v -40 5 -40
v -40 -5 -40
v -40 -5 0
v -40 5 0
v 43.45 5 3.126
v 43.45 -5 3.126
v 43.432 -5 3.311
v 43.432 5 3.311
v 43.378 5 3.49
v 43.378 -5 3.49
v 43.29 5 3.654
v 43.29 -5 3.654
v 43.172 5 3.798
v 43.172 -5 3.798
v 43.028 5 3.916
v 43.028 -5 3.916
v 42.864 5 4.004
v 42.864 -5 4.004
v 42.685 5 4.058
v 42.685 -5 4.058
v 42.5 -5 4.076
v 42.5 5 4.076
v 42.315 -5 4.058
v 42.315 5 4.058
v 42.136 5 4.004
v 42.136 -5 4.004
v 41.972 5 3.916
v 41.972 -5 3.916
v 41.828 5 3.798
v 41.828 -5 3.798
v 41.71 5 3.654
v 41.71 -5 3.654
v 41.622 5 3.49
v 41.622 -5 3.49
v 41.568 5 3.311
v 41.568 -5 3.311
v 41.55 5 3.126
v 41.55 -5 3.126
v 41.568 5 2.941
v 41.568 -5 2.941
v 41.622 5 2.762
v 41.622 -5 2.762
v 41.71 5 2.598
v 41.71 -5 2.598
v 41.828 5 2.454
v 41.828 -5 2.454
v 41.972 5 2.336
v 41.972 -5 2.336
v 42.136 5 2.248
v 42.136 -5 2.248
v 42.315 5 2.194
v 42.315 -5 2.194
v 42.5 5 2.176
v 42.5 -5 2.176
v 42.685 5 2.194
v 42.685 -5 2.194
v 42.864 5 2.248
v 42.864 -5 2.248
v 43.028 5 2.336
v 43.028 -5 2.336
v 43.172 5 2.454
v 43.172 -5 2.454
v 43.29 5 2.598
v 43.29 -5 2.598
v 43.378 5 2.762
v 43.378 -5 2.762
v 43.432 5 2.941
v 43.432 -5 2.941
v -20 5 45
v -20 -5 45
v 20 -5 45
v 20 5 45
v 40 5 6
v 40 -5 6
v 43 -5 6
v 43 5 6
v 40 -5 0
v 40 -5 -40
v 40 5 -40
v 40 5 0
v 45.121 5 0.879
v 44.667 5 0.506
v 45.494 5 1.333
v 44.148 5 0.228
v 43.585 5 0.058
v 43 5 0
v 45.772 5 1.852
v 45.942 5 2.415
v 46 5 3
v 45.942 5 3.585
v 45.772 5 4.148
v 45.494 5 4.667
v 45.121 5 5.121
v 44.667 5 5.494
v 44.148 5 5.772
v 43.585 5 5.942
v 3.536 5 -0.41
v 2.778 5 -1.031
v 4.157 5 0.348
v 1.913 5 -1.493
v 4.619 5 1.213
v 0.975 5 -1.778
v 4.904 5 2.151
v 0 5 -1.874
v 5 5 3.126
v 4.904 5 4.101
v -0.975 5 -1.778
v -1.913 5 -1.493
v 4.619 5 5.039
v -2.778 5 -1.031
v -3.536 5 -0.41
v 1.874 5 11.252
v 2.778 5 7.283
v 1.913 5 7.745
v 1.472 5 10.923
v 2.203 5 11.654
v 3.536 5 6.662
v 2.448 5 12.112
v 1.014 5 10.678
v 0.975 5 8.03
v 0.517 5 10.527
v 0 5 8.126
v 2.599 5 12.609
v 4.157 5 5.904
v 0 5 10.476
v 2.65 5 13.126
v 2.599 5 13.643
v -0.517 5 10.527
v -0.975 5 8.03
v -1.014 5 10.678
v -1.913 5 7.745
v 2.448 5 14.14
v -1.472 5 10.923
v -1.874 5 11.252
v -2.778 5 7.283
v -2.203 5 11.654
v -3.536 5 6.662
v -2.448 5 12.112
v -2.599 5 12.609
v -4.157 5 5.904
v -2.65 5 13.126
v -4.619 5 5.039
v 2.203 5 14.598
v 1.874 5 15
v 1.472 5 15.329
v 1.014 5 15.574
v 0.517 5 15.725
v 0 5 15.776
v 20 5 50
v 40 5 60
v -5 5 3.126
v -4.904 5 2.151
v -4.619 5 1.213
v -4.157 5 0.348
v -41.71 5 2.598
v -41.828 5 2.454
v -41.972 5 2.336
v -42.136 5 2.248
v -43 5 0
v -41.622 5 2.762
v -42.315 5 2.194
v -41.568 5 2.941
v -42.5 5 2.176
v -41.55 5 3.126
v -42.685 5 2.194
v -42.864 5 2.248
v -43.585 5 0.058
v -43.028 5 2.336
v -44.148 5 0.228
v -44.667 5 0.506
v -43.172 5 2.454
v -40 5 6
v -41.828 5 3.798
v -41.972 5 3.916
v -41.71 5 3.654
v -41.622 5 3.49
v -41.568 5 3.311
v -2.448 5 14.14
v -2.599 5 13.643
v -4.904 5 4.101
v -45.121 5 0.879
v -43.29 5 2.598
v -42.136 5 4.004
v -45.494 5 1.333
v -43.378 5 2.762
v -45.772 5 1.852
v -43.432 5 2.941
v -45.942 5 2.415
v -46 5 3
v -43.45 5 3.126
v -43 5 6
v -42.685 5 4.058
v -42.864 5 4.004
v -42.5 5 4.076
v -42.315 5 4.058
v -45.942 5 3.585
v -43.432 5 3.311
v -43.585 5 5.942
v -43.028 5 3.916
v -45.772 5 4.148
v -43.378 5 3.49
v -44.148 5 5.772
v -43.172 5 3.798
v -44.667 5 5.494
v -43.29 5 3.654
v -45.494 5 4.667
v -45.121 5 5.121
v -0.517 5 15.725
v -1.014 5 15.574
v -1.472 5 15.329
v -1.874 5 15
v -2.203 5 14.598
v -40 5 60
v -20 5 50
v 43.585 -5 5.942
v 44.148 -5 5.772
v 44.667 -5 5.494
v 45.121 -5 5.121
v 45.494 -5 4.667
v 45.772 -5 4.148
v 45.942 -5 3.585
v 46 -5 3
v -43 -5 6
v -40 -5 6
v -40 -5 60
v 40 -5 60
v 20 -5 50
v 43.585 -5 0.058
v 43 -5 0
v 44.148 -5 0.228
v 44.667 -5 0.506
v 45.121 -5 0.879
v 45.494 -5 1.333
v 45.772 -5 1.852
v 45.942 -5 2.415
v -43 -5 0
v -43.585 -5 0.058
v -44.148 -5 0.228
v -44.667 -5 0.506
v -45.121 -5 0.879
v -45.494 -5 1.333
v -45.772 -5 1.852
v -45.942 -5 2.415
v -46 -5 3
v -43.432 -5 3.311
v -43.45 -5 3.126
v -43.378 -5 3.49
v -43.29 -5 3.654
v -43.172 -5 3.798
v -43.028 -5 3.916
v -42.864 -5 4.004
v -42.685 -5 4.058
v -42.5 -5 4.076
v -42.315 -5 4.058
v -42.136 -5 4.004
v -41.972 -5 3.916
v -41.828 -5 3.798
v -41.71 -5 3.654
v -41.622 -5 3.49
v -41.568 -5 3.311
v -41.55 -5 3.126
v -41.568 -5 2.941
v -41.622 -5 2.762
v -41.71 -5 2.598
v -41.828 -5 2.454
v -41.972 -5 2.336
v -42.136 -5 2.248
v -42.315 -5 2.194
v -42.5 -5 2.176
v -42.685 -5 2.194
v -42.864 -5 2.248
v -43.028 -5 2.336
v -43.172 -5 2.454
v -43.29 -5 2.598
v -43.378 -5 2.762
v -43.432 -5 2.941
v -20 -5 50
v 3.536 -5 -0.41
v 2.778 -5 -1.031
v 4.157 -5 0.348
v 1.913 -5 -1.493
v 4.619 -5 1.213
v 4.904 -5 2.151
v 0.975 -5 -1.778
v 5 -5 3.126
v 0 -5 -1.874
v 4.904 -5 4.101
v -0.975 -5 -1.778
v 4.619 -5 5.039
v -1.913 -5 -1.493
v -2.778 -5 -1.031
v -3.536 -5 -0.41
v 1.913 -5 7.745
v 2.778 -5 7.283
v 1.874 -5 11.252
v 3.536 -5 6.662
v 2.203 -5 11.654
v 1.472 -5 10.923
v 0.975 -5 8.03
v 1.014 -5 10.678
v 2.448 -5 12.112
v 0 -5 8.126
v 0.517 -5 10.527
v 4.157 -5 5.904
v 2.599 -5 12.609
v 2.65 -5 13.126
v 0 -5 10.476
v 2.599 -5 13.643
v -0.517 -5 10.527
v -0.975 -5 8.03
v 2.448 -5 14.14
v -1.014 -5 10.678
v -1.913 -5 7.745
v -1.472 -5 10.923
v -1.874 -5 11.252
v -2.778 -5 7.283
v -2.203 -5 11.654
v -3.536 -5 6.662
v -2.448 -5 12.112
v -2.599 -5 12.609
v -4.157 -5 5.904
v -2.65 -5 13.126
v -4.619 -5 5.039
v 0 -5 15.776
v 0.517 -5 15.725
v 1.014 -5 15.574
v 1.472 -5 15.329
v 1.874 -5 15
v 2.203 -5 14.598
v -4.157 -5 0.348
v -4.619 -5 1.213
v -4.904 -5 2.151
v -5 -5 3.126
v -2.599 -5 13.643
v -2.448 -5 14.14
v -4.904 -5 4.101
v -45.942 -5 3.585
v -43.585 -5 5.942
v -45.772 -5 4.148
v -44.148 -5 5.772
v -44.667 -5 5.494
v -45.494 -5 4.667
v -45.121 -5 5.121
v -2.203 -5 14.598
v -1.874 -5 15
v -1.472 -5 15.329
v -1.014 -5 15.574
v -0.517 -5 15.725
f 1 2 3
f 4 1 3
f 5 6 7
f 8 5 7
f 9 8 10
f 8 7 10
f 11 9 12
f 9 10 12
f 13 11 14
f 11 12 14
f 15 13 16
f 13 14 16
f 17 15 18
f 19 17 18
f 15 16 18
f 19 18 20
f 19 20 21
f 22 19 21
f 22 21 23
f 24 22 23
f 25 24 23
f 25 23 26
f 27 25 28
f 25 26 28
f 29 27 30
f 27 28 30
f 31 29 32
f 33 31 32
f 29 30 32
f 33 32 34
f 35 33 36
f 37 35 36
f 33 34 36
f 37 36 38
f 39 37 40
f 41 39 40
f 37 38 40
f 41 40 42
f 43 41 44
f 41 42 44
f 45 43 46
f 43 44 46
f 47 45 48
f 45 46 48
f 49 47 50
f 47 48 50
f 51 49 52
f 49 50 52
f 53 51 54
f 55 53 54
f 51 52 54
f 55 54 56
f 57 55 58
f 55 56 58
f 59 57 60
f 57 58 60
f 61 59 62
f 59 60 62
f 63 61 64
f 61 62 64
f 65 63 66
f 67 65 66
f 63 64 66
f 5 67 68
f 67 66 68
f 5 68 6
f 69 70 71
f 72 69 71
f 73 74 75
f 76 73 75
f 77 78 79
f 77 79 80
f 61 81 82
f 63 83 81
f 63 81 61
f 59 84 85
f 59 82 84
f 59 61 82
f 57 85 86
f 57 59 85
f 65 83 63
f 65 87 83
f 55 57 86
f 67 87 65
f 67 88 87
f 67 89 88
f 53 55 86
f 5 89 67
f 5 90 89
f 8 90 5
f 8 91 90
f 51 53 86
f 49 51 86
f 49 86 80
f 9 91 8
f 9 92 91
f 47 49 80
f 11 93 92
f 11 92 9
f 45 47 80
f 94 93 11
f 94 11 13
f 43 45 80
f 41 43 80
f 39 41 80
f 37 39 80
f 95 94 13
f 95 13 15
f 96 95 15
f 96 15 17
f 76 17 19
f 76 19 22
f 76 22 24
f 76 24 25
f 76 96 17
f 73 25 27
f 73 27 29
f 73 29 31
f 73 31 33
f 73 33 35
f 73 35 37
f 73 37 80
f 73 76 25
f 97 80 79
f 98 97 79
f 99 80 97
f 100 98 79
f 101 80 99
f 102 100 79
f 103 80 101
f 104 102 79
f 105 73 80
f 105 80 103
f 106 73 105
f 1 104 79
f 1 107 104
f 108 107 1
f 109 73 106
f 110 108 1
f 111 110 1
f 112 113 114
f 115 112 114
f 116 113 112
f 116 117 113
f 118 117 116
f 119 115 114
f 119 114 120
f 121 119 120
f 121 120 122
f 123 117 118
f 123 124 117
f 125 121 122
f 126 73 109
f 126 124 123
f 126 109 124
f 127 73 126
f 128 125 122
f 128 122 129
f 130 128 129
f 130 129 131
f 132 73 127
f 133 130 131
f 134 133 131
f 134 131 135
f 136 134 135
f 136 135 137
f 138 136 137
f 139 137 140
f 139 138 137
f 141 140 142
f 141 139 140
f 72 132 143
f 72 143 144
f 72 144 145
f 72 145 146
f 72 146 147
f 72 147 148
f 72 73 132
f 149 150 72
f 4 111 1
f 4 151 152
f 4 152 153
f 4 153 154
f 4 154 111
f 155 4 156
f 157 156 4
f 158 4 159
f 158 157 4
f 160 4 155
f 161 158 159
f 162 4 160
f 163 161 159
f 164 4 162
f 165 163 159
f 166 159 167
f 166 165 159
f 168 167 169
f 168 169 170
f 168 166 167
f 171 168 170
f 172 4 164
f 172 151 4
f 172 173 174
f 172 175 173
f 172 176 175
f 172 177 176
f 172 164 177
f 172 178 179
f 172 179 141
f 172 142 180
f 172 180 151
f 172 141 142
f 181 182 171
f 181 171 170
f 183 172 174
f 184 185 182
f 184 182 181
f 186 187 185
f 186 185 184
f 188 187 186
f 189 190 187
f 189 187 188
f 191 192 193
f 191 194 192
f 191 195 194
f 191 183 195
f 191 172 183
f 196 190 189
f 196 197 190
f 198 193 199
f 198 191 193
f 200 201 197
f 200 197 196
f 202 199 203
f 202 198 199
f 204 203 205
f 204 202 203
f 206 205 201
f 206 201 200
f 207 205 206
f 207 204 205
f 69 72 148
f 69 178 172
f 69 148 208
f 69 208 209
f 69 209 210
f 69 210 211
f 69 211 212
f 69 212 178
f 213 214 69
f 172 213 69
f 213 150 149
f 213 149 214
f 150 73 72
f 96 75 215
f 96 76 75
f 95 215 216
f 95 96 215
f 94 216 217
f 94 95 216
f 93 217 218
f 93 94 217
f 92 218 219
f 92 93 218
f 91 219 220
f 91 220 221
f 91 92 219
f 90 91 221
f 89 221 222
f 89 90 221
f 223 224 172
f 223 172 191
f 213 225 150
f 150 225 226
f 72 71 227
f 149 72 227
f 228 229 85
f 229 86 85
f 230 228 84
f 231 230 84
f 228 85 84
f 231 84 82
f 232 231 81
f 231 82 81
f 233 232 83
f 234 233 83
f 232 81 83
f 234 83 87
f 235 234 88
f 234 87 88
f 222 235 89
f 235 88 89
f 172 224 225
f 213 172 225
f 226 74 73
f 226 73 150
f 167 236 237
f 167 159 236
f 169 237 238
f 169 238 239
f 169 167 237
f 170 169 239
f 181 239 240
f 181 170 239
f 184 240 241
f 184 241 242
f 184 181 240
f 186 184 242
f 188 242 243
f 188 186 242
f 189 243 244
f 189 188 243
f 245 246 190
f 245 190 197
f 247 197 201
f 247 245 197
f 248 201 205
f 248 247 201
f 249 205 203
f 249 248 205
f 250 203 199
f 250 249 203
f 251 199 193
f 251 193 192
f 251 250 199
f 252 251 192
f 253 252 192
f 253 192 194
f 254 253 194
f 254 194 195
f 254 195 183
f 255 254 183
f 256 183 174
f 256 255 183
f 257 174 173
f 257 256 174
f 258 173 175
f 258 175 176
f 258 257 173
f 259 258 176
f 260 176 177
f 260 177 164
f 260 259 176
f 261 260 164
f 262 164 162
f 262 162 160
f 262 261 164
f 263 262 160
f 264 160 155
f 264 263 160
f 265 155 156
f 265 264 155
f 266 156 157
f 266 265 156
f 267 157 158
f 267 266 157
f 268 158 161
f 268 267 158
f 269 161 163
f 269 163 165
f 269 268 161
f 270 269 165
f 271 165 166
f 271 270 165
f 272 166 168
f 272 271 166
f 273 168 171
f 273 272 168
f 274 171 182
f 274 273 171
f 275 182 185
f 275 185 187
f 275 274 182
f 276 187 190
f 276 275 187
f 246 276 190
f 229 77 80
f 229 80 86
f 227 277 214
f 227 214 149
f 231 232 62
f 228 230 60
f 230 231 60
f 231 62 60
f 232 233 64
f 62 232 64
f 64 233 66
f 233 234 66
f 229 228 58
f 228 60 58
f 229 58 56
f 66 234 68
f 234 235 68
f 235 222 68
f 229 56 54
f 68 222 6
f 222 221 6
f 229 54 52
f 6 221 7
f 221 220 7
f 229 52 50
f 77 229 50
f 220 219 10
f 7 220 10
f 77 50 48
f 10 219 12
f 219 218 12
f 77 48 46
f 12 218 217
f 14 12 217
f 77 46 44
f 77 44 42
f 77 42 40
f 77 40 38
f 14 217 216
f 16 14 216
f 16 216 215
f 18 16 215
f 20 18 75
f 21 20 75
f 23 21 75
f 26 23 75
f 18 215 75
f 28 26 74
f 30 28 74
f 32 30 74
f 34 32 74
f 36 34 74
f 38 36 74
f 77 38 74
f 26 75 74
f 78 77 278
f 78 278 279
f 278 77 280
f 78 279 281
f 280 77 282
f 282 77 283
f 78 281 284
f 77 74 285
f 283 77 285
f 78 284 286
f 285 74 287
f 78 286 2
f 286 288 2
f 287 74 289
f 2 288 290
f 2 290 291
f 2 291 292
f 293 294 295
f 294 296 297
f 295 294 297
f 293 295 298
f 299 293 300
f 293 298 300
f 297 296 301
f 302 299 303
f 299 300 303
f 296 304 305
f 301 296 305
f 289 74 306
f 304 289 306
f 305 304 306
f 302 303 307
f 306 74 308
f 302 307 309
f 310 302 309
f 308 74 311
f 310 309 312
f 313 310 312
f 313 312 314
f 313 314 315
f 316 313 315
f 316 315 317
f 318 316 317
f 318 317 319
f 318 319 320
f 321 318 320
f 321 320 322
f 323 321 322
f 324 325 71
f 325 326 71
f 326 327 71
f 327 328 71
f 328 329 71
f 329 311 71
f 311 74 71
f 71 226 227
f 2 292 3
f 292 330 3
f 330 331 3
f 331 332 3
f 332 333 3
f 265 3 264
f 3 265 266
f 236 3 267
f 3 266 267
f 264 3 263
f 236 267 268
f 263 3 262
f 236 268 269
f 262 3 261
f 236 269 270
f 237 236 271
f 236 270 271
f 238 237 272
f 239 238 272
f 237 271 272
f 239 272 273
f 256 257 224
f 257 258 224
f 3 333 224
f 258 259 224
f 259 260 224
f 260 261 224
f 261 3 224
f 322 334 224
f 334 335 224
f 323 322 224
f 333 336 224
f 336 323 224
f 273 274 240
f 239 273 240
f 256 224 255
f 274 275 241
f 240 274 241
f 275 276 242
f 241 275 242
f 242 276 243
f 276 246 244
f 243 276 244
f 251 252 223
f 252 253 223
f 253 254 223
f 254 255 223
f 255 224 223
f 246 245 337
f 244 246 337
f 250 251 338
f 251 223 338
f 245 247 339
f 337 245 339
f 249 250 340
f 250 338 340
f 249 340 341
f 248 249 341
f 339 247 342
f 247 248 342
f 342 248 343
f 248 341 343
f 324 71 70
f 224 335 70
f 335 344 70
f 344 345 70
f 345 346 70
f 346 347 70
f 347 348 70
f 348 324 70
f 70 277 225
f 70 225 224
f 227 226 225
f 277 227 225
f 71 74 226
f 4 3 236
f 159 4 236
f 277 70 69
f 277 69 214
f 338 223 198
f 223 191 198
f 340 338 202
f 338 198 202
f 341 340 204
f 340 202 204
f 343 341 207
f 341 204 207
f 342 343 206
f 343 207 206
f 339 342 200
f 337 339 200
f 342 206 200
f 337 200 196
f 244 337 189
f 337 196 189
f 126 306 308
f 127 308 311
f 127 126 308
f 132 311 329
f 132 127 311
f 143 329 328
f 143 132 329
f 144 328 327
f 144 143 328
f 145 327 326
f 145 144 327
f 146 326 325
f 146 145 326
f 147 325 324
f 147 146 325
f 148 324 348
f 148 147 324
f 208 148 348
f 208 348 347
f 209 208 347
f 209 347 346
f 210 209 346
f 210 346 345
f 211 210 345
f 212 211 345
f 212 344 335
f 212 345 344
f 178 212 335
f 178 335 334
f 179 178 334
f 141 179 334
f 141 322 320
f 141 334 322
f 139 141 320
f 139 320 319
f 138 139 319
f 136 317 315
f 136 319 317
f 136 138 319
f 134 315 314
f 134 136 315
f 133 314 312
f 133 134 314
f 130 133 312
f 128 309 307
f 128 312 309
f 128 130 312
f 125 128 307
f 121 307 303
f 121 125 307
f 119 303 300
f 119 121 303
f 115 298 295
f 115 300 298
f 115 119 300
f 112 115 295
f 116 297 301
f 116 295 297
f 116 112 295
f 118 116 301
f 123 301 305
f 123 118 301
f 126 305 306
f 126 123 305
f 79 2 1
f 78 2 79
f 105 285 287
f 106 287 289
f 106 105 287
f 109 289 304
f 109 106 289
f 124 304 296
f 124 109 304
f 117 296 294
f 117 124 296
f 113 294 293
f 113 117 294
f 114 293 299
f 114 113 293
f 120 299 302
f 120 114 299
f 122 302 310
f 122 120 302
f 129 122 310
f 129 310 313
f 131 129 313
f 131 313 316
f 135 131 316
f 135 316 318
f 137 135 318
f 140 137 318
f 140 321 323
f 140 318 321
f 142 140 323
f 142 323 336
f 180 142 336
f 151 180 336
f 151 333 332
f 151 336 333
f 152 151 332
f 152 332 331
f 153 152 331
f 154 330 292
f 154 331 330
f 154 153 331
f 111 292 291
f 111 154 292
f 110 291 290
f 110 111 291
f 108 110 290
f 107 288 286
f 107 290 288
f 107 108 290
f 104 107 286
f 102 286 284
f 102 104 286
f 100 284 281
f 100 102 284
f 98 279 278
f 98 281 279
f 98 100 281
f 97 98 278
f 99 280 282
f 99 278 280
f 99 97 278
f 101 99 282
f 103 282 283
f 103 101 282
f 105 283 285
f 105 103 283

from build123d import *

# Parameters (mm, degrees)
F0_W           = 80
F0_H           = 120
F0_R           = 5
F0_R_2         = 2.65
F1_DEPTH       = 5
F2_W           = 80
F2_H           = 20
F3_DEPTH       = 10
F4_W           = 6
F4_H           = 6
F4_R           = 0.95
F5_DEPTH       = 10
F6_R           = 2.99999
F9_W           = 40
F9_H           = 5
F10_DEPTH      = 12
F10_DEPTH_BACK = 10


# Not quite as in the source:
# - a fillet or chamfer is up to 0.001 mm smaller than in the source, because OpenCascade refuses the exact size


with BuildPart() as f1:
    # F0 (on Front) → F1 (new body, symmetric)
    with BuildSketch(Plane.XZ):
        Rectangle(F0_W, F0_H)
        with Locations((0, 3.126)):
            Circle(F0_R, mode=Mode.SUBTRACT)
        with Locations((0, 13.126)):
            Circle(F0_R_2, mode=Mode.SUBTRACT)
    extrude(amount=F1_DEPTH, both=True)

    # F2 (on face) → F3 (cut)
    with BuildSketch(Plane.XZ.offset(5)):
        with Locations((0, -50)):
            Rectangle(F2_W, F2_H)
    extrude(amount=-F3_DEPTH, mode=Mode.SUBTRACT)

    # F4 (on face) → F5 (join)
    with BuildSketch(Plane.XZ.offset(5)):
        with Locations((43, 3)):
            Rectangle(F4_W, F4_H)
        with Locations((42.5, 3.126)):
            Circle(F4_R, mode=Mode.SUBTRACT)
    extrude(amount=-F5_DEPTH)

    # F6 (radius 3 in the source; OpenCascade refuses exactly that, so slightly less here)
    f6_edges = [f1.edges().sort_by_distance(p)[0] for p in [
        (46, 0, 0),
        (46, 0, 6),
    ]]
    fillet(f6_edges, radius=F6_R)

    # F7: F1 across plane


with BuildPart() as f1_1:
    add(f1.part)
    add(f1.part.mirror(Plane.YZ))

    # F9 (on face) → F10 (cut, two sides)
    with BuildSketch(Plane.XZ.offset(5)) as f10_sk:
        with Locations((0, 47.5)):
            Rectangle(F9_W, F9_H)
    extrude(amount=-F10_DEPTH, mode=Mode.SUBTRACT)
    extrude(f10_sk.sketch, amount=F10_DEPTH_BACK, mode=Mode.SUBTRACT)


solid = f1_1.part
